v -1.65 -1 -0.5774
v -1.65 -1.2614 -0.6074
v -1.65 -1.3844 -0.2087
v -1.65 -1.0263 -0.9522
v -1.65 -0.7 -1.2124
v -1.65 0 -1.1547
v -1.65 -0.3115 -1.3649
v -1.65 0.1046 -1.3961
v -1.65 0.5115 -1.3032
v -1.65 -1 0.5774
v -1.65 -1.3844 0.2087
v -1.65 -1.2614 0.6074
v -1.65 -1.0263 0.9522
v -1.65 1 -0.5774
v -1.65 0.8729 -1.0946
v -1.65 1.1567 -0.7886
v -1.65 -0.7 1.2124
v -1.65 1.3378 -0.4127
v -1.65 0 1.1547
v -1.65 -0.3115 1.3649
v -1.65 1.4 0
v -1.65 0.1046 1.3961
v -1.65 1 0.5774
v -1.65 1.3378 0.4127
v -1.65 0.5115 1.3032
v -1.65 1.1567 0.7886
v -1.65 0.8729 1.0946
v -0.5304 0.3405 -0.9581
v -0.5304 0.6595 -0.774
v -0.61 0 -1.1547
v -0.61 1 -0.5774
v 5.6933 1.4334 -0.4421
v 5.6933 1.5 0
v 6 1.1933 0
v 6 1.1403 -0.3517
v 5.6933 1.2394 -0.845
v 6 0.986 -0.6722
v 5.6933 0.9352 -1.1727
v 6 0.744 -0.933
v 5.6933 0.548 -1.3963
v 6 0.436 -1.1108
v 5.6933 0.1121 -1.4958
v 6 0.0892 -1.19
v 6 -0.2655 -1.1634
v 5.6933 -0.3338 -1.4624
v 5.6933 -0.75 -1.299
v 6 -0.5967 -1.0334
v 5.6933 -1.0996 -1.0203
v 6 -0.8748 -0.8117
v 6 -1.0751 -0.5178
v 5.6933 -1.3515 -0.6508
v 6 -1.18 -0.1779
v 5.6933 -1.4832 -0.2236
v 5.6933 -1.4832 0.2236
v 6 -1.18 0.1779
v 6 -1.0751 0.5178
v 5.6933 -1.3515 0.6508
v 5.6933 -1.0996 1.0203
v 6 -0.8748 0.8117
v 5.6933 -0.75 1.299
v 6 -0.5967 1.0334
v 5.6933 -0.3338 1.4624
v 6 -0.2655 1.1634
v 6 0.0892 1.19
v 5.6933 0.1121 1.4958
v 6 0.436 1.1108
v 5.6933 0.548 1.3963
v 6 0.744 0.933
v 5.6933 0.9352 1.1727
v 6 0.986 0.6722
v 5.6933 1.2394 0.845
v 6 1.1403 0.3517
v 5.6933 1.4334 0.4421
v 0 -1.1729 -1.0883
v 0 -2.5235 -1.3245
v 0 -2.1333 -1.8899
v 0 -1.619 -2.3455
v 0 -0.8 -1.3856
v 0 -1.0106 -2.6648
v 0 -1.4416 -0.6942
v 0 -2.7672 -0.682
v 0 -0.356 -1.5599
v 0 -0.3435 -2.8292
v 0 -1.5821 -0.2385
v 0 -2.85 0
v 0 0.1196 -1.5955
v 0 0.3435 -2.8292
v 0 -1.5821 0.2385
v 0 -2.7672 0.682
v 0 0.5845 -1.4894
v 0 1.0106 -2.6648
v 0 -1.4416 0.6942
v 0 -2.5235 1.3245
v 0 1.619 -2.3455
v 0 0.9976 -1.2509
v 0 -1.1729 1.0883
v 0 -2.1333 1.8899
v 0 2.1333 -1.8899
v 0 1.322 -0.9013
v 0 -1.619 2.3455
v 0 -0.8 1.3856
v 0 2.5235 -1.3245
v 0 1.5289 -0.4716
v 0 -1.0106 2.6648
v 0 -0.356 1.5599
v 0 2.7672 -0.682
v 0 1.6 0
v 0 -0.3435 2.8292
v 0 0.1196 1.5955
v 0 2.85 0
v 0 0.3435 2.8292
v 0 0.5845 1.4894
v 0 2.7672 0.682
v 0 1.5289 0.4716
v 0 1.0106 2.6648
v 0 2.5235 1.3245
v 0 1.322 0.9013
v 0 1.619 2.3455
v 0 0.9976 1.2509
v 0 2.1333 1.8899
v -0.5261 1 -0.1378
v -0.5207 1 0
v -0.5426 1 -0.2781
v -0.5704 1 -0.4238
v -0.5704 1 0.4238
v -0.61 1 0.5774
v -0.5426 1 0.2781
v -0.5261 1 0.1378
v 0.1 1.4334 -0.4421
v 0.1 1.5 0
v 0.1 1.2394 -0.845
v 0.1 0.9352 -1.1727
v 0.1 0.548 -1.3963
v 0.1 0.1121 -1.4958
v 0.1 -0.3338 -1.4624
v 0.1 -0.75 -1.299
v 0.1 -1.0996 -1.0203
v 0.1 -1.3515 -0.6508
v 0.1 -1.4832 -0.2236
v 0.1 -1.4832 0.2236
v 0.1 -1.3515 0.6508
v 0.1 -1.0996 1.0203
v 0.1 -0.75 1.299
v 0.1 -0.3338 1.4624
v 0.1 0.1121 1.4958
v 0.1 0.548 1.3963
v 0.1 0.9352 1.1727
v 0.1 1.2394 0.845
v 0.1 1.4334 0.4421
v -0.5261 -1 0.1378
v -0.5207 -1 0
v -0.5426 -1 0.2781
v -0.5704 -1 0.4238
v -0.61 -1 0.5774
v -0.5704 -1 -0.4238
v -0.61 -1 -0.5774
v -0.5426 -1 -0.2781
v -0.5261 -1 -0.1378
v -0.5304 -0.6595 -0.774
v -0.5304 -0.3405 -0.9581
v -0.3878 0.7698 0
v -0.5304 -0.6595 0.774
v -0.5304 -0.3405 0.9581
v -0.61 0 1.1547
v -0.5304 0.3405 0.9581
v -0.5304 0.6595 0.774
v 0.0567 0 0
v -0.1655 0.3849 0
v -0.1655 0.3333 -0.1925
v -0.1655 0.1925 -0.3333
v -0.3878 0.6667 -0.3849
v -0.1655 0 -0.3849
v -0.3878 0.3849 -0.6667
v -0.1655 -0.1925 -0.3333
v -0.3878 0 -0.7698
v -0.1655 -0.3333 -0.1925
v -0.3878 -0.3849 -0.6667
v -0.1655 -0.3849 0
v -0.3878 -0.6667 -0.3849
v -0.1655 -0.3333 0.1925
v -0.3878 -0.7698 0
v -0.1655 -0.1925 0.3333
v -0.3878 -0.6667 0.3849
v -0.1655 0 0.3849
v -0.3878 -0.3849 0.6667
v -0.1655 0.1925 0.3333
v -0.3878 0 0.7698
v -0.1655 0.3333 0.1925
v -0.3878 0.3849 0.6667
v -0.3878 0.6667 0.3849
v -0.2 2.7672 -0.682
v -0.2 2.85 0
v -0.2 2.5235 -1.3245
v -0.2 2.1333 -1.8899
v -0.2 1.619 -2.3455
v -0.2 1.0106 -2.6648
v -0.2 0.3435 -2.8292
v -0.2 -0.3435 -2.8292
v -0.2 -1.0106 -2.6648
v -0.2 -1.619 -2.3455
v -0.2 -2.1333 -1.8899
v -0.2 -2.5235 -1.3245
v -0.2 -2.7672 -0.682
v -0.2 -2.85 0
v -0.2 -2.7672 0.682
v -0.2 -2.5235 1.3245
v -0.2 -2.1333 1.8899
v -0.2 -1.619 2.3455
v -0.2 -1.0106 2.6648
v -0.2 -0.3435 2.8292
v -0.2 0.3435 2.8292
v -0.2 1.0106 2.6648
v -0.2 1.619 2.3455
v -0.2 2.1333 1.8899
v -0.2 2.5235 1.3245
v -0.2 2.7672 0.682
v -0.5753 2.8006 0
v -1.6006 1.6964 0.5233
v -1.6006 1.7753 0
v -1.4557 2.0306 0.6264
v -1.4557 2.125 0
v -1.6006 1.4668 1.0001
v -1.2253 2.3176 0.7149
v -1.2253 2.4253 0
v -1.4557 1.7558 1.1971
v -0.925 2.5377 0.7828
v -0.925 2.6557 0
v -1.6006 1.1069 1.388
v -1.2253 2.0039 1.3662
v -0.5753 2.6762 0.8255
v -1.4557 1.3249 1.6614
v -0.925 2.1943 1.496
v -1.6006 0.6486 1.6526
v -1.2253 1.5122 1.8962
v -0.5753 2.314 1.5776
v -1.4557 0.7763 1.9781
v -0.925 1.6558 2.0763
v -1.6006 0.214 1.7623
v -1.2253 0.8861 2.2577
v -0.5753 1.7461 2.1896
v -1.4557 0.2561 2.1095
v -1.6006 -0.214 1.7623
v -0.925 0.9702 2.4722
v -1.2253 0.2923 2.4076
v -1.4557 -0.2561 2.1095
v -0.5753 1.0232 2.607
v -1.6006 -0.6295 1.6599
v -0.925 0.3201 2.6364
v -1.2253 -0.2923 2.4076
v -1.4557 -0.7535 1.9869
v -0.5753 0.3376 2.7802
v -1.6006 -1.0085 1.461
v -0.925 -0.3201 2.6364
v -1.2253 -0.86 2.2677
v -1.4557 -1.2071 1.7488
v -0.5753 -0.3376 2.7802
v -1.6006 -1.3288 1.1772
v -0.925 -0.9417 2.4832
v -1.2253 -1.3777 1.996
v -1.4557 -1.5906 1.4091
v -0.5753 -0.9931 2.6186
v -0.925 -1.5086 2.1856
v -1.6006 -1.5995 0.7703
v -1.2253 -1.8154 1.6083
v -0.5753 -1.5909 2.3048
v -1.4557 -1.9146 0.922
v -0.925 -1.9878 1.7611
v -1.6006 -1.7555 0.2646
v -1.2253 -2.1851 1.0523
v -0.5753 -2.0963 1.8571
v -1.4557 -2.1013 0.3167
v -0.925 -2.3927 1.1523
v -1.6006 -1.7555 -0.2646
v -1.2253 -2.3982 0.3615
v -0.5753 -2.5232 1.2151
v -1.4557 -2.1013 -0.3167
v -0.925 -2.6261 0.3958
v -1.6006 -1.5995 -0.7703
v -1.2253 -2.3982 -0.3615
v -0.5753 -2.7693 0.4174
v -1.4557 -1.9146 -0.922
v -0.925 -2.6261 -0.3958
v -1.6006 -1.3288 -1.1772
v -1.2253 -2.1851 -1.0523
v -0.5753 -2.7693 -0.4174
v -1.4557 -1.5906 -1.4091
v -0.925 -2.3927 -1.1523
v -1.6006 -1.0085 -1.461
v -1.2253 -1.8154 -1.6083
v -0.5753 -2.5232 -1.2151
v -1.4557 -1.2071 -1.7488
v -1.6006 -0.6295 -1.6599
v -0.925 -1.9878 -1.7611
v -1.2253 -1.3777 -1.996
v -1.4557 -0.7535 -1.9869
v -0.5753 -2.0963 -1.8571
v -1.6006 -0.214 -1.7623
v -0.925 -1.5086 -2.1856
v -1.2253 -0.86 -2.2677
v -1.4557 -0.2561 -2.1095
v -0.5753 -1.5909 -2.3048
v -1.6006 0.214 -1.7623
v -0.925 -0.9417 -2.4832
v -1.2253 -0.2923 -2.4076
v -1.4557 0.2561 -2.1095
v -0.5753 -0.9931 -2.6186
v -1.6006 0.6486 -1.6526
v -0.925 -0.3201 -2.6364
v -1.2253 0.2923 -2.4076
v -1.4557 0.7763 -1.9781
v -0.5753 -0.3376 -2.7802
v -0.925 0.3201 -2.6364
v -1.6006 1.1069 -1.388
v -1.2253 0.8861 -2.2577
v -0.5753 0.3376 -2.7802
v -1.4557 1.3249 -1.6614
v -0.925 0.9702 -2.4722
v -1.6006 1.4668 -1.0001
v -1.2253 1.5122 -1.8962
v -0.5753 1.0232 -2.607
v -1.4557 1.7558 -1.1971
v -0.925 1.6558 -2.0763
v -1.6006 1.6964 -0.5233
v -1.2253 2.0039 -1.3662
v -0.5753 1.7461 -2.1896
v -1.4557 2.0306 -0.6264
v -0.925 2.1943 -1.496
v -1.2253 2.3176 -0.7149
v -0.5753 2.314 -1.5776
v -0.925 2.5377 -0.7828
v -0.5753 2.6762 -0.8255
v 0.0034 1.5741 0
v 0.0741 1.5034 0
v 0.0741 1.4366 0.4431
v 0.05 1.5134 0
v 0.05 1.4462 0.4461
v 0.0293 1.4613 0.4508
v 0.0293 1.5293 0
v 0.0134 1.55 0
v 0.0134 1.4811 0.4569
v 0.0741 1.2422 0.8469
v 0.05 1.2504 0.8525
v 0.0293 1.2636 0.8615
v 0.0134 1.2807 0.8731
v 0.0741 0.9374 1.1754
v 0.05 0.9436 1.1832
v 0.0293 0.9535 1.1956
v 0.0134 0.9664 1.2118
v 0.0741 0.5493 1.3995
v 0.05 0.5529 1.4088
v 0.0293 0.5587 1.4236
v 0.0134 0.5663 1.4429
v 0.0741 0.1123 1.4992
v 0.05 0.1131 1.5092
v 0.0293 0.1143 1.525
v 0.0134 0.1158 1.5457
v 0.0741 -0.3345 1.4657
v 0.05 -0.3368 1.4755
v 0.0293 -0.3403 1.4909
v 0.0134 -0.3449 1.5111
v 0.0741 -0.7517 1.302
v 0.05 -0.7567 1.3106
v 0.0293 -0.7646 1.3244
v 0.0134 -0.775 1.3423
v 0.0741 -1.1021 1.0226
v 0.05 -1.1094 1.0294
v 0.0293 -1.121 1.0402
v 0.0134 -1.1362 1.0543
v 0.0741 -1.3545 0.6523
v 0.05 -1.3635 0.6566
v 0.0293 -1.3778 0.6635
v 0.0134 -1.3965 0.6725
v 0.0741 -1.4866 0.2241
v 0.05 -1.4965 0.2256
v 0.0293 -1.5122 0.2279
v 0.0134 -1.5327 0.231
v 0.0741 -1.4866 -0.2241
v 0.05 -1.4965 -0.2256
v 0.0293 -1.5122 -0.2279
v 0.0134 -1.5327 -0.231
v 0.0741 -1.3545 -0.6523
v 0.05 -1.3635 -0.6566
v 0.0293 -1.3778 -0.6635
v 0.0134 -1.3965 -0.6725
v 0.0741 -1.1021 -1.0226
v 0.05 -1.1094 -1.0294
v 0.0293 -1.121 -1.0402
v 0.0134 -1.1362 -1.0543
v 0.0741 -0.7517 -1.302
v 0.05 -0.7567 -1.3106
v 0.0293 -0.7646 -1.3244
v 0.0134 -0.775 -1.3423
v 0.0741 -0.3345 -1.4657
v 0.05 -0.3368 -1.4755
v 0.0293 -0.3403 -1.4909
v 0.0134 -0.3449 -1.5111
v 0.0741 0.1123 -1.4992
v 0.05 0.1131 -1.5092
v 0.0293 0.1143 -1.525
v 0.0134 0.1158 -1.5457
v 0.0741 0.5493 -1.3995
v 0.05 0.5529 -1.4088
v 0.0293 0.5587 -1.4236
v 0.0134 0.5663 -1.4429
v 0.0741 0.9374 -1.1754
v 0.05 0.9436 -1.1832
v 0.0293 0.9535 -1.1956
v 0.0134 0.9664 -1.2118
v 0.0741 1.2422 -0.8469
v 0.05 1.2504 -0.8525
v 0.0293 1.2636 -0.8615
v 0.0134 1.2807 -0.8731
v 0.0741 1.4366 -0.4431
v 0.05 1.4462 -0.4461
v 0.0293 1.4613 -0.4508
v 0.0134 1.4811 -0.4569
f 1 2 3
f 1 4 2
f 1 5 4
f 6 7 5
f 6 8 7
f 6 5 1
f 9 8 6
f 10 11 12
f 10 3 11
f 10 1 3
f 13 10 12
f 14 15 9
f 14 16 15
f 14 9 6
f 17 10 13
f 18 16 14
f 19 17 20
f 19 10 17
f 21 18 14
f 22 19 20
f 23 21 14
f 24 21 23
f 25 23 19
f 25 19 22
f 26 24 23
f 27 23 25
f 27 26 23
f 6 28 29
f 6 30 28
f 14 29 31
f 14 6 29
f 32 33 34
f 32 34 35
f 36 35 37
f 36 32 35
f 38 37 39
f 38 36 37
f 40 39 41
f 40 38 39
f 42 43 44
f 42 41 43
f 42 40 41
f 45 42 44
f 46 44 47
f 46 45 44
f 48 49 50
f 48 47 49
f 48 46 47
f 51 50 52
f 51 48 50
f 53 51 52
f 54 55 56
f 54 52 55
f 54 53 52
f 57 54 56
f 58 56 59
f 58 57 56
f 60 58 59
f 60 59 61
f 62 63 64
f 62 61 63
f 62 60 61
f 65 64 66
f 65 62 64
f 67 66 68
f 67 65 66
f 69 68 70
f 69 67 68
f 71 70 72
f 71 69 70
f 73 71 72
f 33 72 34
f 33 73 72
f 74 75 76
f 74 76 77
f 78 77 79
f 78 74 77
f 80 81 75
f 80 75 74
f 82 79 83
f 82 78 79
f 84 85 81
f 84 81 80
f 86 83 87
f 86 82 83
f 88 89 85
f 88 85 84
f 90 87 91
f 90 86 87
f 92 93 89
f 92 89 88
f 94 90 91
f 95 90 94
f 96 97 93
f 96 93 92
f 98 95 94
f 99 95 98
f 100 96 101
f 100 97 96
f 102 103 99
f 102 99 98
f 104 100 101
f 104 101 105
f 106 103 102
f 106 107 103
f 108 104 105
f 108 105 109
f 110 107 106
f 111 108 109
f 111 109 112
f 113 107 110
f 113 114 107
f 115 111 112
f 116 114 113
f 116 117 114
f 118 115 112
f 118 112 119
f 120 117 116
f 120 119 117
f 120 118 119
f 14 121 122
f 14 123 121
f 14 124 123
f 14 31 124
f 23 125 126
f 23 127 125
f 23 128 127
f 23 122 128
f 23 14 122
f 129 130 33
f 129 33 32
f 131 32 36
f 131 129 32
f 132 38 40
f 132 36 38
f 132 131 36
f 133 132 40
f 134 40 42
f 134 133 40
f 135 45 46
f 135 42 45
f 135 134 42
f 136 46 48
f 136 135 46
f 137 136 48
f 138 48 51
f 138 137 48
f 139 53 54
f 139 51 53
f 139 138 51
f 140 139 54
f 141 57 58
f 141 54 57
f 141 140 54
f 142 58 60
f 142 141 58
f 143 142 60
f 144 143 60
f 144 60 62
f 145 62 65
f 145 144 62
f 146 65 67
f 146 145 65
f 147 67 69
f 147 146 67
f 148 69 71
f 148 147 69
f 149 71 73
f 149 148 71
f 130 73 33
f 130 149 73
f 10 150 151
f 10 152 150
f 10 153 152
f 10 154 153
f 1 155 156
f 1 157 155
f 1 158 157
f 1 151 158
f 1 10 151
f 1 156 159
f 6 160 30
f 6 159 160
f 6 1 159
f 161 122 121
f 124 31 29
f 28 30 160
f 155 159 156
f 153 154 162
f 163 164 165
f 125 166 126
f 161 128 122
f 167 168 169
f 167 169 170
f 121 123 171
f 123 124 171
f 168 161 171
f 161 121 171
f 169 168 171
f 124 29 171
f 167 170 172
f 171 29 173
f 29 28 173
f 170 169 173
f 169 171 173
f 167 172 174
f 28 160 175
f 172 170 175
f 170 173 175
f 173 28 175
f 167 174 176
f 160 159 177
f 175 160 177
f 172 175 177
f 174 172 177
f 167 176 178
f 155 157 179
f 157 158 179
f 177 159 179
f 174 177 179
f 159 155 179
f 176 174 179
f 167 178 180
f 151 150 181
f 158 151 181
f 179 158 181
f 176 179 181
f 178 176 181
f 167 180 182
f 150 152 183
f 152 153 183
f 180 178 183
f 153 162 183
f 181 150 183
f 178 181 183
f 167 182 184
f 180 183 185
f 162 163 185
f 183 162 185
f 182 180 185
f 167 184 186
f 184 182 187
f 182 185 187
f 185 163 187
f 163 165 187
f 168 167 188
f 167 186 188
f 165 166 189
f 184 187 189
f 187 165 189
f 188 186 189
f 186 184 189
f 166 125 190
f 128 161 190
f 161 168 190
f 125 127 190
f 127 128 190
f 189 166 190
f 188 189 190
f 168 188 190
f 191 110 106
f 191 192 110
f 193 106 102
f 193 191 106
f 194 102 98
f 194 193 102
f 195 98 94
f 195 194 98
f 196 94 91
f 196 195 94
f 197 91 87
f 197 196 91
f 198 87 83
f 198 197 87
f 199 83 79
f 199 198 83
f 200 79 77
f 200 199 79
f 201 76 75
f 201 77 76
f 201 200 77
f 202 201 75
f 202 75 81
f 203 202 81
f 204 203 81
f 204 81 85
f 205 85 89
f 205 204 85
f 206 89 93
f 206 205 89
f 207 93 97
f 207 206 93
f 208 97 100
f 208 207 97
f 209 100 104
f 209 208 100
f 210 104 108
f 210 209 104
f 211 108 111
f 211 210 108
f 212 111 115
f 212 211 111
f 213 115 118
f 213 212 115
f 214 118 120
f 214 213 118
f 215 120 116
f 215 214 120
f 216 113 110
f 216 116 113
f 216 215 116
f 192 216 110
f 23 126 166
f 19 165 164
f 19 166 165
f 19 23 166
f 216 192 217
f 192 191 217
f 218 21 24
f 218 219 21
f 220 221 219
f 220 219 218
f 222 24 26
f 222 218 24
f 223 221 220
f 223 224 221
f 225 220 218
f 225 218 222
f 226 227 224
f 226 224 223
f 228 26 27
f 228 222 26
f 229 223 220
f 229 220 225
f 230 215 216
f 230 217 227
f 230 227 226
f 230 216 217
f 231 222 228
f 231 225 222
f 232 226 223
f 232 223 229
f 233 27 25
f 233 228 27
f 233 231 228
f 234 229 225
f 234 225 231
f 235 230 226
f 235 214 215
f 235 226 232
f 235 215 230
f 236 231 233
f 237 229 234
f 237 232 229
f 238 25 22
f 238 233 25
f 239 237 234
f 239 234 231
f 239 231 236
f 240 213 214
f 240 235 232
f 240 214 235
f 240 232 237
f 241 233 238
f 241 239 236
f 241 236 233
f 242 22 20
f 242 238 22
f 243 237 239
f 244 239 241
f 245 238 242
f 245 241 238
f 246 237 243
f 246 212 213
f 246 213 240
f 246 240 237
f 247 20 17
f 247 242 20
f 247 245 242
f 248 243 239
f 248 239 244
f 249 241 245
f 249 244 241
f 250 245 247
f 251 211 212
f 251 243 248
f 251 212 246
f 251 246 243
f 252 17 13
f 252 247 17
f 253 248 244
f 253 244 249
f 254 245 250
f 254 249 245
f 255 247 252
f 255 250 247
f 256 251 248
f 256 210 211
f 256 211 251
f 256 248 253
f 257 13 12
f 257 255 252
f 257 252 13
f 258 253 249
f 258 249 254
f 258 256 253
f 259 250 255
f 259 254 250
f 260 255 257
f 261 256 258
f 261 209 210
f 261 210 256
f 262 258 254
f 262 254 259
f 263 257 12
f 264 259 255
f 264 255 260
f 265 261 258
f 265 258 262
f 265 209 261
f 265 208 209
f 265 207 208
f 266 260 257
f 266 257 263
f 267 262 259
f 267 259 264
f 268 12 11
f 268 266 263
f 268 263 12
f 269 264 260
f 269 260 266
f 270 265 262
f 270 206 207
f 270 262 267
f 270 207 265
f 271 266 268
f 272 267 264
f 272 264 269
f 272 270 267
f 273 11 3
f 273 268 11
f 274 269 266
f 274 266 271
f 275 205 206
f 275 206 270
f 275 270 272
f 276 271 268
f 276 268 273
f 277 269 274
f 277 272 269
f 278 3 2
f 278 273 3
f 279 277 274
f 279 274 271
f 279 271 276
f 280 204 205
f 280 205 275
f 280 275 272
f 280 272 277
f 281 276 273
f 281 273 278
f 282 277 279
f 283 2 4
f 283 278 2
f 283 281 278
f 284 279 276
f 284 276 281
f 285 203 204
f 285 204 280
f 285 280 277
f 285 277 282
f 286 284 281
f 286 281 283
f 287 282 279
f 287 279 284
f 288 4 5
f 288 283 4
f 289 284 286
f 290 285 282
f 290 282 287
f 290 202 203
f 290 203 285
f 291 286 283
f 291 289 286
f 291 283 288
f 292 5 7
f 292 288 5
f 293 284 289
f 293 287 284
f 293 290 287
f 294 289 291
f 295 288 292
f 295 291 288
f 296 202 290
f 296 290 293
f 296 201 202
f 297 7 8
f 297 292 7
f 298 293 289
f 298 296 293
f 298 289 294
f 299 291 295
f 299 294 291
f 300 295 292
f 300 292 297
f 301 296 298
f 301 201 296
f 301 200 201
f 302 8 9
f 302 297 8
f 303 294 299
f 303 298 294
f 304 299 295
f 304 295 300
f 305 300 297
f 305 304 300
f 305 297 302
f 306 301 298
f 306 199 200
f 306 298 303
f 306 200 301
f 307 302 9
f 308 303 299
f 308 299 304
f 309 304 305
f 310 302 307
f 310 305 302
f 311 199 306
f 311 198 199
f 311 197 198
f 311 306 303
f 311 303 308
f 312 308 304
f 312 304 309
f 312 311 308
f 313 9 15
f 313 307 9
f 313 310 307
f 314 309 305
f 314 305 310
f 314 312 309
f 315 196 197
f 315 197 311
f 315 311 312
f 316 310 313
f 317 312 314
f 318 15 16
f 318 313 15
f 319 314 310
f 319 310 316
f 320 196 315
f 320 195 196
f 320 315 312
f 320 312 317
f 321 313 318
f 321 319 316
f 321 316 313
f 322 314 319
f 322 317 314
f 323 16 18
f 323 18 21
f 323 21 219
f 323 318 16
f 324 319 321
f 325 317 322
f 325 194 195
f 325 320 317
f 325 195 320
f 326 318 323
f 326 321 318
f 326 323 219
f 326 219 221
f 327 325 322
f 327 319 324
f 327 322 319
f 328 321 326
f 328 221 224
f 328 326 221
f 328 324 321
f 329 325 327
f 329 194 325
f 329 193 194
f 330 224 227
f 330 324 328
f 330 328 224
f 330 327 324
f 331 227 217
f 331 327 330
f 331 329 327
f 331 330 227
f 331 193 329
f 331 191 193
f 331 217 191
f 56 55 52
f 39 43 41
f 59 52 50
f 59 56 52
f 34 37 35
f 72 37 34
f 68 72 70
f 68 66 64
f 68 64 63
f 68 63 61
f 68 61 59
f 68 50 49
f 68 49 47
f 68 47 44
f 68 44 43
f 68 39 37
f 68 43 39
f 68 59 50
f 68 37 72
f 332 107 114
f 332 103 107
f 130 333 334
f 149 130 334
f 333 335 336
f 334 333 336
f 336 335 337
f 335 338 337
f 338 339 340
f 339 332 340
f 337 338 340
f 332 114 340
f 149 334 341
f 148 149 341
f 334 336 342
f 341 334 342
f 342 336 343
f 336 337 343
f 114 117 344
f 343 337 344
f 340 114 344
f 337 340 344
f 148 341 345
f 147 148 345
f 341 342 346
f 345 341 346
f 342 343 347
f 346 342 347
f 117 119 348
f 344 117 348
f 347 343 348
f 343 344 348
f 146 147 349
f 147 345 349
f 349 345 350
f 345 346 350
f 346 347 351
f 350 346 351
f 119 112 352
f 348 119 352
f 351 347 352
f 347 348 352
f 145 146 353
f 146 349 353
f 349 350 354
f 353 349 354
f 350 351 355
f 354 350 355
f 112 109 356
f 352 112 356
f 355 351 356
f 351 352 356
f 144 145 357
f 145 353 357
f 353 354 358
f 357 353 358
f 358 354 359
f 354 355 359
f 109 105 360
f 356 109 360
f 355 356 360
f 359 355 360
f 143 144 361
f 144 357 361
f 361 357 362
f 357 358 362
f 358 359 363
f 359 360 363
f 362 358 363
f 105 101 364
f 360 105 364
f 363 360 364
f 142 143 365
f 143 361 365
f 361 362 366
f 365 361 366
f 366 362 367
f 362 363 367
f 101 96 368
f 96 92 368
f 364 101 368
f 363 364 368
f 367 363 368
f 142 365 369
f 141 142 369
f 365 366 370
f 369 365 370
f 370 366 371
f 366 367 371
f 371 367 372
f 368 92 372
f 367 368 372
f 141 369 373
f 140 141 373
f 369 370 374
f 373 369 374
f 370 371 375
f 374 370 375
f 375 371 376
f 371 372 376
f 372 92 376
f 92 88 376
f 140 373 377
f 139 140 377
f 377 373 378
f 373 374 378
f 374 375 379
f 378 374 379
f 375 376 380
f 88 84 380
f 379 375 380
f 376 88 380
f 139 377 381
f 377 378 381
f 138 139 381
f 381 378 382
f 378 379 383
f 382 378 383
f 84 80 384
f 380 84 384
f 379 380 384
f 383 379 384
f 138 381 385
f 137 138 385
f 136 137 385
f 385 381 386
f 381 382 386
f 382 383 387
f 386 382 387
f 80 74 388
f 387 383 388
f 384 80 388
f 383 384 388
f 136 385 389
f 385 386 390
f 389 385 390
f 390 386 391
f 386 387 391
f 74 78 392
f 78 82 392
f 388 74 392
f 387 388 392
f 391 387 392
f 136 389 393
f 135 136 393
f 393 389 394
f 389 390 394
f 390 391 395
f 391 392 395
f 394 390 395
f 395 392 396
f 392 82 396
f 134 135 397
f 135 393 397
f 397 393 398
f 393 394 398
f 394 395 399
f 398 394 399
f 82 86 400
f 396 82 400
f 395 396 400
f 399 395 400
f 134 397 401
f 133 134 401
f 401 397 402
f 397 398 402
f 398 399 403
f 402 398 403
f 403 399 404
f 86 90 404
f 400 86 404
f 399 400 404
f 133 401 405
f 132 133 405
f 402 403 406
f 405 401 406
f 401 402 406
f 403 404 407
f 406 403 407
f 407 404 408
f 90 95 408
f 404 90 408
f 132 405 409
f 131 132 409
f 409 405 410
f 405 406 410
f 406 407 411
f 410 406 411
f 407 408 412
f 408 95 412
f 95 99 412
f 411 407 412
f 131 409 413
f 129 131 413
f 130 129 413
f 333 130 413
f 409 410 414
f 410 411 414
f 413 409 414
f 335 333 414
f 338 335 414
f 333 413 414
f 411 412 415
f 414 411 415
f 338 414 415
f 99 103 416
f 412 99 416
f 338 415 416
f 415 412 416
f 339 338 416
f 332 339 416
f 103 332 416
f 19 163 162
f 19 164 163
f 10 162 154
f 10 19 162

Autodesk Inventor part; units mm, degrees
ref_plane "YZ Plane" through (0, 0, 0) normal (1, 0, 0) x (0, 1, 0)
ref_plane "XZ Plane" through (0, 0, 0) normal (0, 1, 0) x (-1, 0, 0)
sketch "Sketch1" plane through (0, 0, 0) normal (0, 0, 1) x (1, 0, 0)
  line L0 (0.0567, 0) -> (6, 0)
  line L1 (6, 0) -> (6, 1.5)
  line L2 (6, 1.5) -> (1, 1.5)
  line L3 (1, 1.5) -> (0.6932, 1.5)
  line L4 (0.6932, 1.5) -> (0, 1.5)
  line L5 (0, 1.5) -> (0, 2.85)
  line L6 (0, 2.85) -> (-1.65, 2.85)
  line L7 (-1.65, 2.85) -> (-1.65, 1.1547)
  line L8 (-1.65, 1.1547) -> (-0.61, 1.1547)
  line L9 (-0.61, 1.1547) -> (0.0567, 0)
  line L10 (-3.18, 0) -> (7.53, 0) projected
  line L11 (0, -0.57) -> (0, 3.42) projected
  line L12 (1, 1.5) -> (0, 1.5) construction
  dimension "d1" = 5
  dimension "d2" = 0.3068
  dimension "d3" = 1.65
  dimension "d4" = 1.04
  dimension "d5" = 60
  dimension "d6" = 3
  dimension "d7" = 3
  dimension "d8" = 2.3094
  dimension "d9" = 5.7
  dimension "d26" = 6
revolve "Body" add sketch "Sketch1" angle 360 about axis through (0.0567, 0, 0) along (1, 0, 0) contours L9 L11 L4 L3 L2 L1 L0 | L9 L8 L7 L6 L5 L11
sketch "Sketch2" plane through (-1.65, 0, 0) normal (-1, 0, 0) x (0, 0, 1)
  circle A0 centre (0, 0) radius 1.1547 projected
  line L0 (0, -3.99) -> (0, 3.99) projected
  line L1 (-3.99, 0) -> (3.99, 0) projected
  line L2 (1.1547, 0) -> (0.5774, -1)
  line L3 (0.5774, -1) -> (-0.5774, -1)
  line L4 (-0.5774, -1) -> (-1.1547, 0)
  line L5 (-1.1547, 0) -> (-0.5774, 1)
  line L6 (-0.5774, 1) -> (0.5774, 1)
  line L7 (0.5774, 1) -> (1.1547, 0)
extrude "Slot" add sketch "Sketch2" against normal up to next contours L7 A0 | A0 L2 | L6 L0 A0 | A0 L0 L3 | L0 L6 A0 | A0 L3 L0 | L4 A0 | A0 L5
fillet "Fillet1" radius 1.45 1 edges at (-1.65, -2.85, 0)
thread "Thread" size "M3x0.5" designation "M3" class "6g" standard "GB Metric profile" length 5
chamfer "Chamfer1" distance 0.3067 distance2 0.3067 1 edges at (6, -1.5, 0) measured on face at (6, 0.3952, 0.0397)
ref_plane "Work Plane1" through (29, 0, 0) normal (0, -1, 0) x (1, 0, 0)
fillet "Fillet2" radius 0.1 1 edges at (0, -1.5, 0)
equation "\"d1\" = GEL"
equation "\"d3\" = KOH"
equation "\"d4\" = INTI"
equation "\"d6\" = GD"
equation "\"d7\" = BDM"
equation "\"d8\" = 1.1547 * SW"
equation "\"d9\" = KOD"
equation "\"d26\" = NLG"
equation "\"d30\" = R"
equation "\"d17\" = RR"
equation "\"d13\" = GEL"
equation "\"d15\" = -0.5 * SPD + 0.5 * GD"
equation "\"d16\" = GUL"
equation "\"GD\" = 3"
equation "\"NLG\" = 6"
equation "\"GEL\" = 5"
equation "\"KOD\" = 5.7"
equation "\"KOH\" = 1.65"
equation "\"INTI\" = 1.04"
equation "\"GAL\" = 0.61345 * PTC"
equation "\"GUL\" = 0.61345 * PTC"
equation "\"BDM\" = 3"
equation "\"SW\" = 2"
equation "\"RR\" = 1.45"
equation "\"SPD\" = NND - 1.2269 * PTC"
equation "\"R\" = 0.1"
equation "\"TOA\" = 30deg"
equation "\"GD1\" = THREADDIA - 1.2269 * PTC"
equation "\"THREADDIA\" = 3"
equation "\"PTC\" = 0.5"
equation "\"NND\" = 3"
equation "\"KOH1\" = 0.2"
equation "\"E0\" = 2.31"
properties part number "Screw GB/T 70.2 M3 X 6" material "Steel, Mild"
